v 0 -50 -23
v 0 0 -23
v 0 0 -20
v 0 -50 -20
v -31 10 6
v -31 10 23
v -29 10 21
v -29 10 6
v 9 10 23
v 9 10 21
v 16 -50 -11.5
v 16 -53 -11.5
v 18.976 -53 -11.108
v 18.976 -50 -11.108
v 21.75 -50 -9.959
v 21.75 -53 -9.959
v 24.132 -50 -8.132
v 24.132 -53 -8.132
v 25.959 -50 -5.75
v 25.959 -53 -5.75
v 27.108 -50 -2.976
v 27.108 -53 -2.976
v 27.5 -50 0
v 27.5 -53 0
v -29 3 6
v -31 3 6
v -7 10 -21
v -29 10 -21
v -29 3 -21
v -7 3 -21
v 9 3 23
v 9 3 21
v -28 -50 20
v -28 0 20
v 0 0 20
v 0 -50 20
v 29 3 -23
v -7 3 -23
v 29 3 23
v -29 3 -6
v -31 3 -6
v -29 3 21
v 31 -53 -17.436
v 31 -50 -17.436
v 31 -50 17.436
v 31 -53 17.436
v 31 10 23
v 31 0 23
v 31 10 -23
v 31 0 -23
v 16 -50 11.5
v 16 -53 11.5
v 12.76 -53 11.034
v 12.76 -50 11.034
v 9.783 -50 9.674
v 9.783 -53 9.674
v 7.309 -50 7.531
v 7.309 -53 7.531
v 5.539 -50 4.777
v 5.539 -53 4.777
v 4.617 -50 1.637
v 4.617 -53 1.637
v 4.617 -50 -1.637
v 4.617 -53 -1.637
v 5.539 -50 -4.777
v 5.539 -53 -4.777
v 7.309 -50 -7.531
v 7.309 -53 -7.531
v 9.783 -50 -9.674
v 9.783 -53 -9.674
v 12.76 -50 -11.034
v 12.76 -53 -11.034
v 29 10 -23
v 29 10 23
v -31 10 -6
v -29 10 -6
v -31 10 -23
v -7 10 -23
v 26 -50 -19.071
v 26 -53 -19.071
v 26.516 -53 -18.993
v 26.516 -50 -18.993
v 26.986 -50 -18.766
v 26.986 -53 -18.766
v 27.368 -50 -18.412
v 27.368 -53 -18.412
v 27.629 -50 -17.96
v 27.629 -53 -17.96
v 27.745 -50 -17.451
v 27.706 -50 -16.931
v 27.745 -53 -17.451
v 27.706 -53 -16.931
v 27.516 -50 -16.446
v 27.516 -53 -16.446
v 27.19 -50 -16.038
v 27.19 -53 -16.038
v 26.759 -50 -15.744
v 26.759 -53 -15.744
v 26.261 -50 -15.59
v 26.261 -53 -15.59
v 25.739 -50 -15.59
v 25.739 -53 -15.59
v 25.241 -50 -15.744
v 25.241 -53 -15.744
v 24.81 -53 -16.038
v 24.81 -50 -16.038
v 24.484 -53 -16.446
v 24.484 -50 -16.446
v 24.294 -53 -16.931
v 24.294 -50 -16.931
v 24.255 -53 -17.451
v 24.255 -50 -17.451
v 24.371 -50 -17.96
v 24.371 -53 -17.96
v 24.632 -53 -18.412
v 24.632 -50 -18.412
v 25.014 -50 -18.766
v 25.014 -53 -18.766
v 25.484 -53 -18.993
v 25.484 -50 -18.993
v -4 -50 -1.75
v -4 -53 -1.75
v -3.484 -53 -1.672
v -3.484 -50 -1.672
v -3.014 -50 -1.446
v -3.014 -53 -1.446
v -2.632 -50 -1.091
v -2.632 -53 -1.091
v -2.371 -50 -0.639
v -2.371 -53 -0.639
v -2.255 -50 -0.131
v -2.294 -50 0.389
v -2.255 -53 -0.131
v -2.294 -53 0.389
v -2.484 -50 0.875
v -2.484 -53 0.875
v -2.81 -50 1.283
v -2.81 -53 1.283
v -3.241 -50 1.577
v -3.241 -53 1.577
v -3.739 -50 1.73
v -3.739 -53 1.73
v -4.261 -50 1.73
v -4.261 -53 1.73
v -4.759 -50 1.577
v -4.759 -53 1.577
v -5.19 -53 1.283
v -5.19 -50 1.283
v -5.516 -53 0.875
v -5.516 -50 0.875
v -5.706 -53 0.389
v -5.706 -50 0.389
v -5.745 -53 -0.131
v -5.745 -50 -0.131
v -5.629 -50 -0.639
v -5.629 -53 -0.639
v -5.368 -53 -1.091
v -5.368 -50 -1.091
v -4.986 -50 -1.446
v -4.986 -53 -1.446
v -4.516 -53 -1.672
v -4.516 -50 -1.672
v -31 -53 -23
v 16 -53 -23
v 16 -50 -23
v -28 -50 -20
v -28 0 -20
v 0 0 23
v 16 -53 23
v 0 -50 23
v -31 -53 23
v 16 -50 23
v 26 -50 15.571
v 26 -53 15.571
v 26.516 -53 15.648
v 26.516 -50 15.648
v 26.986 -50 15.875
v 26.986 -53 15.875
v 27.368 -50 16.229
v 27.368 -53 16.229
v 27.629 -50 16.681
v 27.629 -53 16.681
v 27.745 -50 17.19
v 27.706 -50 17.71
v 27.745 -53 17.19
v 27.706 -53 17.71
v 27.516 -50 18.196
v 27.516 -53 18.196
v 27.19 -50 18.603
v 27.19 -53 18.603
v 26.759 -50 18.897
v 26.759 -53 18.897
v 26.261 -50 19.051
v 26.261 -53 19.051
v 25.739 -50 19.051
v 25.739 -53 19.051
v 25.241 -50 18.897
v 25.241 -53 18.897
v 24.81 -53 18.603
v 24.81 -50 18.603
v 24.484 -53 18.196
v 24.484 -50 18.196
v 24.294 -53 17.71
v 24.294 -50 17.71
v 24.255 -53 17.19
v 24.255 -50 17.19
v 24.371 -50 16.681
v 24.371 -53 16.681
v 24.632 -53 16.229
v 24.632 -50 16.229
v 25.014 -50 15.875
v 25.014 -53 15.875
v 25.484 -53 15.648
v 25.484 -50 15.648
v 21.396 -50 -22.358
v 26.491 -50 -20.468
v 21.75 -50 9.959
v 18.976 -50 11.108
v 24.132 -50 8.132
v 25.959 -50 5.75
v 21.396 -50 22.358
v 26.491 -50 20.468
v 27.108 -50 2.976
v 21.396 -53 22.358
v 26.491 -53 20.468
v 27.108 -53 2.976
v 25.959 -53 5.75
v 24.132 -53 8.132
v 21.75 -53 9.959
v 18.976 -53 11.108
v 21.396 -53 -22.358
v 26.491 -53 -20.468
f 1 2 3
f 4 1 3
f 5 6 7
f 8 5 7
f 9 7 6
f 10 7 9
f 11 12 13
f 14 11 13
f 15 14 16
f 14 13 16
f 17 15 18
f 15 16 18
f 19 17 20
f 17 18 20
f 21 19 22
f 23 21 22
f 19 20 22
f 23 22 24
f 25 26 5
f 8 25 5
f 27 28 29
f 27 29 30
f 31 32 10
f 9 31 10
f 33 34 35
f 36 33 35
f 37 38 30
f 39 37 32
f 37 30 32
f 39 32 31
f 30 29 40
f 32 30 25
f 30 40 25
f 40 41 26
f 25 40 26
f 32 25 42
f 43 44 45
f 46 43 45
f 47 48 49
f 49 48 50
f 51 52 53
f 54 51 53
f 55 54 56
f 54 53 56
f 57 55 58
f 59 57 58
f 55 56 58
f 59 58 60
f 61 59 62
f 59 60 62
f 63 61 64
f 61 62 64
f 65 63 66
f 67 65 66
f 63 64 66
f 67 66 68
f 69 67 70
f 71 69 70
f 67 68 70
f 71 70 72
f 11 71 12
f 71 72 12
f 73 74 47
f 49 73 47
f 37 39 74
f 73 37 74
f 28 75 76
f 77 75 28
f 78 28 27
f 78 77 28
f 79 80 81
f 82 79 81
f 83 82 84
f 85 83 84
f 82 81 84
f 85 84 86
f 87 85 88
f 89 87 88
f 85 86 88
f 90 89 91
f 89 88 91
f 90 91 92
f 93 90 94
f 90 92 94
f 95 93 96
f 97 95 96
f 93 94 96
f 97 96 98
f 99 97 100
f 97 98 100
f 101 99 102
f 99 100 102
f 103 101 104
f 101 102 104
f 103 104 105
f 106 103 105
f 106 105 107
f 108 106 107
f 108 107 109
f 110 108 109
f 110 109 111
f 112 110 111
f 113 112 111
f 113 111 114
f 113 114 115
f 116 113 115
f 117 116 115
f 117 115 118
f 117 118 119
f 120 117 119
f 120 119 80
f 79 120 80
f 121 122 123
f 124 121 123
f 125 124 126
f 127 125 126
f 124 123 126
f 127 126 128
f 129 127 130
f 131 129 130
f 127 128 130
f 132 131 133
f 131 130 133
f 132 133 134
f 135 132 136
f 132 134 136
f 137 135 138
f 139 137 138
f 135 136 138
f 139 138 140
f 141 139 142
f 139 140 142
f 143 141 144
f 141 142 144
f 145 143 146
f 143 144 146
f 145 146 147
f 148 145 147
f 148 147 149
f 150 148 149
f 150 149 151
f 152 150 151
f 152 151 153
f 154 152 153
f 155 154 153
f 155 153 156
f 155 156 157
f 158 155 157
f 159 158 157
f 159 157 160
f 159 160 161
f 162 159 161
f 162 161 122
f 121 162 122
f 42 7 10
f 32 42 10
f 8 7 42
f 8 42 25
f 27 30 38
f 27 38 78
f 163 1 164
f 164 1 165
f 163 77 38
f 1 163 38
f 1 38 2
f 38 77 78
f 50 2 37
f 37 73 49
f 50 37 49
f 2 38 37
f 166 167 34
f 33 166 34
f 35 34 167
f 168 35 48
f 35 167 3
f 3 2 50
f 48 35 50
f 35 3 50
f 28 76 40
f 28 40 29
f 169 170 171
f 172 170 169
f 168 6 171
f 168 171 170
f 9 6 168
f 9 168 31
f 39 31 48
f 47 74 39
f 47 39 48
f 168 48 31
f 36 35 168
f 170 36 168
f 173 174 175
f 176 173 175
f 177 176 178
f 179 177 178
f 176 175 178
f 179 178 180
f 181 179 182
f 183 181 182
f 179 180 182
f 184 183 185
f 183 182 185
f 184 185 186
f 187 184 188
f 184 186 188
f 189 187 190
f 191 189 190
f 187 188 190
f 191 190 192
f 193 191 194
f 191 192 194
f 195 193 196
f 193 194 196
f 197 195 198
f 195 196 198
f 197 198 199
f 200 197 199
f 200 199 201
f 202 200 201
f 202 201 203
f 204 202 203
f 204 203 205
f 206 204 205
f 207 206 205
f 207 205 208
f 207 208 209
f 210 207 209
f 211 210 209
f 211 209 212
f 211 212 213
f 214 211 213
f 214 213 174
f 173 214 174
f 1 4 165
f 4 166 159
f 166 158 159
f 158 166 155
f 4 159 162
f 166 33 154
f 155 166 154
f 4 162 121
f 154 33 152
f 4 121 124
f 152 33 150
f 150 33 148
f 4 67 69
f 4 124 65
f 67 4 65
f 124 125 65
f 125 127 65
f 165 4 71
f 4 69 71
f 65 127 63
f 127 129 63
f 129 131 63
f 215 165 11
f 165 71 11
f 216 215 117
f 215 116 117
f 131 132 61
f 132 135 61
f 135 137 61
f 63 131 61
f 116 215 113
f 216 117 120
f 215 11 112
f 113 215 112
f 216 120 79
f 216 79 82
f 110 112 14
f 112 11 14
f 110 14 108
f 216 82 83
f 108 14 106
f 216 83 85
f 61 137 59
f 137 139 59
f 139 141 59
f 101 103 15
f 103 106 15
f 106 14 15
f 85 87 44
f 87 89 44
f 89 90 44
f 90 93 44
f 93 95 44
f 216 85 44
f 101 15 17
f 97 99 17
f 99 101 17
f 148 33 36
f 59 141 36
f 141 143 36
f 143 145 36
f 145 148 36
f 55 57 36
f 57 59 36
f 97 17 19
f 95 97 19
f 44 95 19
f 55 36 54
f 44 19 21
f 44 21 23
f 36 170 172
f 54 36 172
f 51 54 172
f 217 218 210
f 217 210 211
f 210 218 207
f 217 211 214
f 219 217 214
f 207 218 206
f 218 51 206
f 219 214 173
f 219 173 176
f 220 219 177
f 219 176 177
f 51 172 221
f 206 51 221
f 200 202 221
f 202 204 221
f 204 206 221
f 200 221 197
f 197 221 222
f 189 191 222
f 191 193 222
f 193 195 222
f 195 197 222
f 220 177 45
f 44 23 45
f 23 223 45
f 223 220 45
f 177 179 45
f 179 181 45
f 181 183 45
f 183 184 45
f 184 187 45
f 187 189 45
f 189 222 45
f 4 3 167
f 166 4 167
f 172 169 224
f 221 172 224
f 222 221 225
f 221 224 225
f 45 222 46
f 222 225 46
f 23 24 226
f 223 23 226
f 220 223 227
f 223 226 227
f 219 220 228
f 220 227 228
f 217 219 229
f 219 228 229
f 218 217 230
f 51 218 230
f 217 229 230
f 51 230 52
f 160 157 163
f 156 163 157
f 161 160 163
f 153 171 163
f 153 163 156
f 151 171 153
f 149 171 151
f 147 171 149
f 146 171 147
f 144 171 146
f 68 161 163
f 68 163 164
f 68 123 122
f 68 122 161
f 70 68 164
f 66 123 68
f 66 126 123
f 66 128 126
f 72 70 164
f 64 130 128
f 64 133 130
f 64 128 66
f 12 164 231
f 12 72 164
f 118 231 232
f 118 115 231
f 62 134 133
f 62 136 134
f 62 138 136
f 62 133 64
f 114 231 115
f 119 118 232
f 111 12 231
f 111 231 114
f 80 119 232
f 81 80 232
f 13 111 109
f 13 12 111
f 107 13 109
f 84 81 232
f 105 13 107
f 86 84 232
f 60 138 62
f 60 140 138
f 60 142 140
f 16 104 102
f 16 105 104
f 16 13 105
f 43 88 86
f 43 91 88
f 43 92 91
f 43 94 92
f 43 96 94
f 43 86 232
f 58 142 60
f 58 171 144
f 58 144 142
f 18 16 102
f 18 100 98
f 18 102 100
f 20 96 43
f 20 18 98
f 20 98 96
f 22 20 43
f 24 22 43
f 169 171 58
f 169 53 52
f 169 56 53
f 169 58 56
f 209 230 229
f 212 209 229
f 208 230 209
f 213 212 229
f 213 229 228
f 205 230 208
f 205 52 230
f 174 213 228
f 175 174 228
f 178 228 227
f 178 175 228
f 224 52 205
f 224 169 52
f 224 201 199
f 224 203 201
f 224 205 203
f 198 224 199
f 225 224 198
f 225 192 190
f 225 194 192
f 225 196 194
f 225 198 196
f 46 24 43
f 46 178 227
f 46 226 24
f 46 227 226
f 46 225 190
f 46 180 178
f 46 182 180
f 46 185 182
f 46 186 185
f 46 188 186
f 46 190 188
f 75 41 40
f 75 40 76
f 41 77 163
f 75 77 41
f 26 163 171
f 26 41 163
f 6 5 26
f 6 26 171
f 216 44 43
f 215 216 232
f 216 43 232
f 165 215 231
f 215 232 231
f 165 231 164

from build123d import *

# Parameters (mm, degrees)
SKETCH_1_W          = 62
SKETCH_1_H          = 46
EXTRUDE_1_DEPTH     = 10
SKETCH_2_W          = 58
SKETCH_2_H          = 42
CUT_EXTRUDE_1_DEPTH = 7
CUT_EXTRUDE_2_REACH = 68.88
SKETCH_3_W          = 12
SKETCH_3_H          = 14
CUT_EXTRUDE_3_REACH = 56.745
SKETCH_5_W          = 36
SKETCH_5_H          = 7
CUT_EXTRUDE_4_REACH = 56.745
SKETCH_6_W          = 20
SKETCH_6_H          = 7
EXTRUDE_2_DEPTH     = 50
SKETCH_9_W          = 62
SKETCH_9_H          = 46
EXTRUDE_3_DEPTH     = 3
CUT_EXTRUDE_5_REACH = 75.885
SKETCH_10_R         = 1.75


with BuildPart() as part:
    # 草图1 → 凸台-拉伸1 (new body)
    with BuildSketch(Plane(origin=(0, 0, 0), x_dir=(1, 0, 0), z_dir=(0, 1, 0))):
        Rectangle(SKETCH_1_W, SKETCH_1_H)
    extrude(amount=EXTRUDE_1_DEPTH)

    # 草图2 → 切除-拉伸1 (cut)
    with BuildSketch(Plane(origin=(0, 10, 0), x_dir=(1, 0, 0), z_dir=(0, 1, 0))):
        Rectangle(SKETCH_2_W, SKETCH_2_H)
    extrude(amount=-CUT_EXTRUDE_1_DEPTH, mode=Mode.SUBTRACT)

    # 草图3 → 切除-拉伸2 (cut, up to next)
    with BuildSketch(Plane.ZY.offset(31), mode=Mode.PRIVATE) as cut_extrude_2_sk1:
        with Locations((0, 10)):
            Rectangle(SKETCH_3_W, SKETCH_3_H)
    cut_extrude_2_tool1 = extrude(cut_extrude_2_sk1.sketch, amount=-CUT_EXTRUDE_2_REACH, mode=Mode.PRIVATE) & part.part
    add(cut_extrude_2_tool1.solids().sort_by_distance((-31, 10, 0))[0], mode=Mode.SUBTRACT)

    # 草图5 → 切除-拉伸3 (cut, up to next)
    with BuildSketch(Plane.XY.offset(-21), mode=Mode.PRIVATE) as cut_extrude_3_sk1:
        with Locations((11, 6.5)):
            Rectangle(SKETCH_5_W, SKETCH_5_H)
    cut_extrude_3_tool1 = extrude(cut_extrude_3_sk1.sketch, amount=-CUT_EXTRUDE_3_REACH, mode=Mode.PRIVATE) & part.part
    add(cut_extrude_3_tool1.solids().sort_by_distance((11, 6.5, -21))[0], mode=Mode.SUBTRACT)

    # 草图6 → 切除-拉伸4 (cut, up to next)
    with BuildSketch(Plane(origin=(0, 0, 21), x_dir=(-1, 0, 0), z_dir=(0, 0, -1)), mode=Mode.PRIVATE) as cut_extrude_4_sk1:
        with Locations((-19, 6.5)):
            Rectangle(SKETCH_6_W, SKETCH_6_H)
    cut_extrude_4_tool1 = extrude(cut_extrude_4_sk1.sketch, amount=-CUT_EXTRUDE_4_REACH, mode=Mode.PRIVATE) & part.part
    add(cut_extrude_4_tool1.solids().sort_by_distance((19, 6.5, 21))[0], mode=Mode.SUBTRACT)

    # 草图8 → 凸台-拉伸2 (add)
    with BuildSketch(Plane.XZ):
        Polygon((0, -23), (0, -20), (-28, -20), (-28, 20), (0, 20), (0, 23), (-31, 23), (-31, -23), align=None)
    extrude(amount=EXTRUDE_2_DEPTH)

    # 草图9 → 凸台-拉伸3 (add)
    with BuildSketch(Plane.XZ.offset(50)):
        Rectangle(SKETCH_9_W, SKETCH_9_H)
    extrude(amount=EXTRUDE_3_DEPTH)

    # 草图10 → 切除-拉伸5 (cut, up to next)
    with BuildSketch(Plane.XZ.offset(53), mode=Mode.PRIVATE) as cut_extrude_5_sk1:
        with BuildLine():
            Line((31, 17.435595774), (31, 23))
            Line((31, 23), (16, 23))
            ThreePointArc((16, 23), (23.999415516, 21.564075482), (31, 17.435595774))
        make_face()
    cut_extrude_5_tool1 = extrude(cut_extrude_5_sk1.sketch, amount=-CUT_EXTRUDE_5_REACH, mode=Mode.PRIVATE) & part.part
    # 草图10 → 切除-拉伸5 (cut, up to next)
    with BuildSketch(Plane.XZ.offset(53), mode=Mode.PRIVATE) as cut_extrude_5_sk2:
        with BuildLine():
            ThreePointArc((31, -17.435595774), (23.999415516, -21.564075482), (16, -23))
            Line((16, -23), (31, -23))
            Line((31, -23), (31, -17.435595774))
        make_face()
    cut_extrude_5_tool2 = extrude(cut_extrude_5_sk2.sketch, amount=-CUT_EXTRUDE_5_REACH, mode=Mode.PRIVATE) & part.part
    # 草图10 → 切除-拉伸5 (cut, up to next)
    with BuildSketch(Plane.XZ.offset(53), mode=Mode.PRIVATE) as cut_extrude_5_sk3:
        with Locations(Location((26, -17.320508076, 0), (0, 0, 270))):
            Circle(SKETCH_10_R)
    cut_extrude_5_tool3 = extrude(cut_extrude_5_sk3.sketch, amount=-CUT_EXTRUDE_5_REACH, mode=Mode.PRIVATE) & part.part
    # 草图10 → 切除-拉伸5 (cut, up to next)
    with BuildSketch(Plane.XZ.offset(53), mode=Mode.PRIVATE) as cut_extrude_5_sk4:
        with Locations(Location((26, 17.320508076, 0), (0, 0, 270))):
            Circle(SKETCH_10_R)
    cut_extrude_5_tool4 = extrude(cut_extrude_5_sk4.sketch, amount=-CUT_EXTRUDE_5_REACH, mode=Mode.PRIVATE) & part.part
    # 草图10 → 切除-拉伸5 (cut, up to next)
    with BuildSketch(Plane.XZ.offset(53), mode=Mode.PRIVATE) as cut_extrude_5_sk5:
        with BuildLine():
            ThreePointArc((27.5, 0), (24.131727984, 8.131727984), (16, 11.5))
            Line((16, 11.5), (16, -11.5))
            ThreePointArc((16, -11.5), (24.131727984, -8.131727984), (27.5, 0))
        make_face()
    cut_extrude_5_tool5 = extrude(cut_extrude_5_sk5.sketch, amount=-CUT_EXTRUDE_5_REACH, mode=Mode.PRIVATE) & part.part
    # 草图10 → 切除-拉伸5 (cut, up to next)
    with BuildSketch(Plane.XZ.offset(53), mode=Mode.PRIVATE) as cut_extrude_5_sk6:
        with BuildLine():
            Line((16, -11.5), (16, 11.5))
            ThreePointArc((16, 11.5), (4.5, 0), (16, -11.5))
        make_face()
    cut_extrude_5_tool6 = extrude(cut_extrude_5_sk6.sketch, amount=-CUT_EXTRUDE_5_REACH, mode=Mode.PRIVATE) & part.part
    # 草图10 → 切除-拉伸5 (cut, up to next)
    with BuildSketch(Plane.XZ.offset(53), mode=Mode.PRIVATE) as cut_extrude_5_sk7:
        with BuildLine():
            ThreePointArc((27.5, 0), (24.131727984, 8.131727984), (16, 11.5))
            Line((16, 11.5), (16, -11.5))
            ThreePointArc((16, -11.5), (24.131727984, -8.131727984), (27.5, 0))
        make_face()
    cut_extrude_5_tool7 = extrude(cut_extrude_5_sk7.sketch, amount=-CUT_EXTRUDE_5_REACH, mode=Mode.PRIVATE) & part.part
    # 草图10 → 切除-拉伸5 (cut, up to next)
    with BuildSketch(Plane.XZ.offset(53), mode=Mode.PRIVATE) as cut_extrude_5_sk8:
        with BuildLine():
            Line((16, -11.5), (16, 11.5))
            ThreePointArc((16, 11.5), (4.5, 0), (16, -11.5))
        make_face()
    cut_extrude_5_tool8 = extrude(cut_extrude_5_sk8.sketch, amount=-CUT_EXTRUDE_5_REACH, mode=Mode.PRIVATE) & part.part
    # 草图10 → 切除-拉伸5 (cut, up to next)
    with BuildSketch(Plane.XZ.offset(53), mode=Mode.PRIVATE) as cut_extrude_5_sk9:
        with Locations(Location((-4, 0, 0), (0, 0, 270))):
            Circle(SKETCH_10_R)
    cut_extrude_5_tool9 = extrude(cut_extrude_5_sk9.sketch, amount=-CUT_EXTRUDE_5_REACH, mode=Mode.PRIVATE) & part.part
    add(cut_extrude_5_tool1.solids().sort_by_distance((27.346788, -53, 21.372088))[0], mode=Mode.SUBTRACT)
    add(cut_extrude_5_tool2.solids().sort_by_distance((27.346788, -53, -21.372088))[0], mode=Mode.SUBTRACT)
    add(cut_extrude_5_tool3.solids().sort_by_distance((26, -53, -17.320508))[0], mode=Mode.SUBTRACT)
    add(cut_extrude_5_tool4.solids().sort_by_distance((26, -53, 17.320508))[0], mode=Mode.SUBTRACT)
    add(cut_extrude_5_tool5.solids().sort_by_distance((20.880752, -53, 0))[0], mode=Mode.SUBTRACT)
    add(cut_extrude_5_tool6.solids().sort_by_distance((11.119248, -53, 0))[0], mode=Mode.SUBTRACT)
    add(cut_extrude_5_tool7.solids().sort_by_distance((20.880752, -53, 0))[0], mode=Mode.SUBTRACT)
    add(cut_extrude_5_tool8.solids().sort_by_distance((11.119248, -53, 0))[0], mode=Mode.SUBTRACT)
    add(cut_extrude_5_tool9.solids().sort_by_distance((-4, -53, 0))[0], mode=Mode.SUBTRACT)


solid = part.part
